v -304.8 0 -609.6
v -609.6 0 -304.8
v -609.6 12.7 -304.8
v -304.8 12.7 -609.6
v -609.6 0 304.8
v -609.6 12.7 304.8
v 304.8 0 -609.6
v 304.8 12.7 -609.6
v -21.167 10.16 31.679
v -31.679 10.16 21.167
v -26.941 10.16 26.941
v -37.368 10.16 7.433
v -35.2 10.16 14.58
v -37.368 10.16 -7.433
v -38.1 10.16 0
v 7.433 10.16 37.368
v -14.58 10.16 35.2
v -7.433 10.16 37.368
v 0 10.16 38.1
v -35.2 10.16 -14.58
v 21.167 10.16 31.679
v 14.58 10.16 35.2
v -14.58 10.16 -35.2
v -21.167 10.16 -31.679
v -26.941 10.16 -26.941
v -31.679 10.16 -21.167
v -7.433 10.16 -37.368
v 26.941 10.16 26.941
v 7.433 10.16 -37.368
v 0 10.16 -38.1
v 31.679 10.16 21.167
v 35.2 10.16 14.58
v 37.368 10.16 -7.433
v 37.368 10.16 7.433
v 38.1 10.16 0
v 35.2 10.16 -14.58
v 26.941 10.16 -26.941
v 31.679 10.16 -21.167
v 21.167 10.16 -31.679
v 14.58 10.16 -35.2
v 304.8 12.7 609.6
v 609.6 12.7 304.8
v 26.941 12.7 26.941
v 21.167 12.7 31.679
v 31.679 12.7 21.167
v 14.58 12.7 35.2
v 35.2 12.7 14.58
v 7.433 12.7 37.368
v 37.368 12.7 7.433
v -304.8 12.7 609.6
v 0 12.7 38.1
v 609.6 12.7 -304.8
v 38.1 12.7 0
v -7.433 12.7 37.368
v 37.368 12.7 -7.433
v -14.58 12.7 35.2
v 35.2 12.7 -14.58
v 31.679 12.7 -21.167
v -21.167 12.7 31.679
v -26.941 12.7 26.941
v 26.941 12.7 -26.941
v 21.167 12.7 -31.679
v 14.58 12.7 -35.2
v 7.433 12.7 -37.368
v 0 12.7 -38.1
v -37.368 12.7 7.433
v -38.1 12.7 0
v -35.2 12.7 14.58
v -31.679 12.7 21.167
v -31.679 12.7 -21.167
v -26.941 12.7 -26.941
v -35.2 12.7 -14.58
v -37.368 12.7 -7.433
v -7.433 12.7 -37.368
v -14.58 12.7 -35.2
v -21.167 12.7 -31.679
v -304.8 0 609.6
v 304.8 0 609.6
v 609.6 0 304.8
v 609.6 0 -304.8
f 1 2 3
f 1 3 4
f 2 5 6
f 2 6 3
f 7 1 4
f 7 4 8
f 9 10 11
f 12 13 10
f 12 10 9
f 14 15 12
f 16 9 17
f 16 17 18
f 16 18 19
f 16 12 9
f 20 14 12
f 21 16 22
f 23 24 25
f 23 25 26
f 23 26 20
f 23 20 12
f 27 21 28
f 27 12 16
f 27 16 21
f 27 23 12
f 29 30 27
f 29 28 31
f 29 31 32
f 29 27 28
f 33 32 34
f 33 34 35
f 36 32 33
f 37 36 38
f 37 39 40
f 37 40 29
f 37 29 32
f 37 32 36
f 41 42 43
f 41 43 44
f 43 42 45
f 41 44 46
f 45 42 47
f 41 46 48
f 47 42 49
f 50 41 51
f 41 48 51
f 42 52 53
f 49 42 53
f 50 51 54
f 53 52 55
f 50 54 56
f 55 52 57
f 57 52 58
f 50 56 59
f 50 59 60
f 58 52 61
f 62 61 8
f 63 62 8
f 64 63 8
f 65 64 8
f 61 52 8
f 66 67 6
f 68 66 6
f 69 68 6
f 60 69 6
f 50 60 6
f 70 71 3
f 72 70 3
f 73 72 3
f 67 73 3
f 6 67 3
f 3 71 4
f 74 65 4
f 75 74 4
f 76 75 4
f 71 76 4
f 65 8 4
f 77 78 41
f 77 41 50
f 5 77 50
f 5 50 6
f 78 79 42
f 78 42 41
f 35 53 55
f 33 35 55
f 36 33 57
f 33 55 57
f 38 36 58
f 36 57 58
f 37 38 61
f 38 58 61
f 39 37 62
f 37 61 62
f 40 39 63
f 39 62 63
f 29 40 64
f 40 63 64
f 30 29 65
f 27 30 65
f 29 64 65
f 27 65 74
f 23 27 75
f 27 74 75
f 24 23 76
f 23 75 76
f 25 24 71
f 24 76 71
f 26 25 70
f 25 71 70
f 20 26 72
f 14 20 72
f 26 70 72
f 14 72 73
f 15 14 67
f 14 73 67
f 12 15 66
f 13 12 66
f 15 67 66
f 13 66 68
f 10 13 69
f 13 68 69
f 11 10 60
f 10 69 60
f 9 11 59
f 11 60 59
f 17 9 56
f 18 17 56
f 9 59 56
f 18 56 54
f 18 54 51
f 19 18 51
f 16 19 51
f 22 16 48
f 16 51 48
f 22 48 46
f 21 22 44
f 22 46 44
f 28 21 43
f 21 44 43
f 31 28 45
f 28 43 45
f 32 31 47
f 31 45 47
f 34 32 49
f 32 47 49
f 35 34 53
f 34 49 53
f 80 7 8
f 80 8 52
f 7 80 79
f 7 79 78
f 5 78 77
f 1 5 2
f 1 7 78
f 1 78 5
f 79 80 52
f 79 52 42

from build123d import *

# Parameters (mm, degrees)
BOSS_EXTRUDE1_DEPTH = 12.7
SKETCH2_R           = 38.1
CUT_EXTRUDE1_DEPTH  = 2.54


with BuildPart() as part:
    # Sketch1 → Boss-Extrude1 (new body)
    with BuildSketch(Plane(origin=(0, 0, 0), x_dir=(1, 0, 0), z_dir=(0, 1, 0))):
        Polygon((-609.6, 304.8), (-304.8, 609.6), (304.8, 609.6), (609.6, 304.8), (609.6, -304.8), (304.8, -609.6), (-304.8, -609.6), (-609.6, -304.8), align=None)
    extrude(amount=BOSS_EXTRUDE1_DEPTH)

    # Sketch2 → Cut-Extrude1 (cut)
    with BuildSketch(Plane(origin=(0, 12.7, 0), x_dir=(1, 0, 0), z_dir=(0, 1, 0))):
        Circle(SKETCH2_R)
    extrude(amount=-CUT_EXTRUDE1_DEPTH, mode=Mode.SUBTRACT)


solid = part.part
